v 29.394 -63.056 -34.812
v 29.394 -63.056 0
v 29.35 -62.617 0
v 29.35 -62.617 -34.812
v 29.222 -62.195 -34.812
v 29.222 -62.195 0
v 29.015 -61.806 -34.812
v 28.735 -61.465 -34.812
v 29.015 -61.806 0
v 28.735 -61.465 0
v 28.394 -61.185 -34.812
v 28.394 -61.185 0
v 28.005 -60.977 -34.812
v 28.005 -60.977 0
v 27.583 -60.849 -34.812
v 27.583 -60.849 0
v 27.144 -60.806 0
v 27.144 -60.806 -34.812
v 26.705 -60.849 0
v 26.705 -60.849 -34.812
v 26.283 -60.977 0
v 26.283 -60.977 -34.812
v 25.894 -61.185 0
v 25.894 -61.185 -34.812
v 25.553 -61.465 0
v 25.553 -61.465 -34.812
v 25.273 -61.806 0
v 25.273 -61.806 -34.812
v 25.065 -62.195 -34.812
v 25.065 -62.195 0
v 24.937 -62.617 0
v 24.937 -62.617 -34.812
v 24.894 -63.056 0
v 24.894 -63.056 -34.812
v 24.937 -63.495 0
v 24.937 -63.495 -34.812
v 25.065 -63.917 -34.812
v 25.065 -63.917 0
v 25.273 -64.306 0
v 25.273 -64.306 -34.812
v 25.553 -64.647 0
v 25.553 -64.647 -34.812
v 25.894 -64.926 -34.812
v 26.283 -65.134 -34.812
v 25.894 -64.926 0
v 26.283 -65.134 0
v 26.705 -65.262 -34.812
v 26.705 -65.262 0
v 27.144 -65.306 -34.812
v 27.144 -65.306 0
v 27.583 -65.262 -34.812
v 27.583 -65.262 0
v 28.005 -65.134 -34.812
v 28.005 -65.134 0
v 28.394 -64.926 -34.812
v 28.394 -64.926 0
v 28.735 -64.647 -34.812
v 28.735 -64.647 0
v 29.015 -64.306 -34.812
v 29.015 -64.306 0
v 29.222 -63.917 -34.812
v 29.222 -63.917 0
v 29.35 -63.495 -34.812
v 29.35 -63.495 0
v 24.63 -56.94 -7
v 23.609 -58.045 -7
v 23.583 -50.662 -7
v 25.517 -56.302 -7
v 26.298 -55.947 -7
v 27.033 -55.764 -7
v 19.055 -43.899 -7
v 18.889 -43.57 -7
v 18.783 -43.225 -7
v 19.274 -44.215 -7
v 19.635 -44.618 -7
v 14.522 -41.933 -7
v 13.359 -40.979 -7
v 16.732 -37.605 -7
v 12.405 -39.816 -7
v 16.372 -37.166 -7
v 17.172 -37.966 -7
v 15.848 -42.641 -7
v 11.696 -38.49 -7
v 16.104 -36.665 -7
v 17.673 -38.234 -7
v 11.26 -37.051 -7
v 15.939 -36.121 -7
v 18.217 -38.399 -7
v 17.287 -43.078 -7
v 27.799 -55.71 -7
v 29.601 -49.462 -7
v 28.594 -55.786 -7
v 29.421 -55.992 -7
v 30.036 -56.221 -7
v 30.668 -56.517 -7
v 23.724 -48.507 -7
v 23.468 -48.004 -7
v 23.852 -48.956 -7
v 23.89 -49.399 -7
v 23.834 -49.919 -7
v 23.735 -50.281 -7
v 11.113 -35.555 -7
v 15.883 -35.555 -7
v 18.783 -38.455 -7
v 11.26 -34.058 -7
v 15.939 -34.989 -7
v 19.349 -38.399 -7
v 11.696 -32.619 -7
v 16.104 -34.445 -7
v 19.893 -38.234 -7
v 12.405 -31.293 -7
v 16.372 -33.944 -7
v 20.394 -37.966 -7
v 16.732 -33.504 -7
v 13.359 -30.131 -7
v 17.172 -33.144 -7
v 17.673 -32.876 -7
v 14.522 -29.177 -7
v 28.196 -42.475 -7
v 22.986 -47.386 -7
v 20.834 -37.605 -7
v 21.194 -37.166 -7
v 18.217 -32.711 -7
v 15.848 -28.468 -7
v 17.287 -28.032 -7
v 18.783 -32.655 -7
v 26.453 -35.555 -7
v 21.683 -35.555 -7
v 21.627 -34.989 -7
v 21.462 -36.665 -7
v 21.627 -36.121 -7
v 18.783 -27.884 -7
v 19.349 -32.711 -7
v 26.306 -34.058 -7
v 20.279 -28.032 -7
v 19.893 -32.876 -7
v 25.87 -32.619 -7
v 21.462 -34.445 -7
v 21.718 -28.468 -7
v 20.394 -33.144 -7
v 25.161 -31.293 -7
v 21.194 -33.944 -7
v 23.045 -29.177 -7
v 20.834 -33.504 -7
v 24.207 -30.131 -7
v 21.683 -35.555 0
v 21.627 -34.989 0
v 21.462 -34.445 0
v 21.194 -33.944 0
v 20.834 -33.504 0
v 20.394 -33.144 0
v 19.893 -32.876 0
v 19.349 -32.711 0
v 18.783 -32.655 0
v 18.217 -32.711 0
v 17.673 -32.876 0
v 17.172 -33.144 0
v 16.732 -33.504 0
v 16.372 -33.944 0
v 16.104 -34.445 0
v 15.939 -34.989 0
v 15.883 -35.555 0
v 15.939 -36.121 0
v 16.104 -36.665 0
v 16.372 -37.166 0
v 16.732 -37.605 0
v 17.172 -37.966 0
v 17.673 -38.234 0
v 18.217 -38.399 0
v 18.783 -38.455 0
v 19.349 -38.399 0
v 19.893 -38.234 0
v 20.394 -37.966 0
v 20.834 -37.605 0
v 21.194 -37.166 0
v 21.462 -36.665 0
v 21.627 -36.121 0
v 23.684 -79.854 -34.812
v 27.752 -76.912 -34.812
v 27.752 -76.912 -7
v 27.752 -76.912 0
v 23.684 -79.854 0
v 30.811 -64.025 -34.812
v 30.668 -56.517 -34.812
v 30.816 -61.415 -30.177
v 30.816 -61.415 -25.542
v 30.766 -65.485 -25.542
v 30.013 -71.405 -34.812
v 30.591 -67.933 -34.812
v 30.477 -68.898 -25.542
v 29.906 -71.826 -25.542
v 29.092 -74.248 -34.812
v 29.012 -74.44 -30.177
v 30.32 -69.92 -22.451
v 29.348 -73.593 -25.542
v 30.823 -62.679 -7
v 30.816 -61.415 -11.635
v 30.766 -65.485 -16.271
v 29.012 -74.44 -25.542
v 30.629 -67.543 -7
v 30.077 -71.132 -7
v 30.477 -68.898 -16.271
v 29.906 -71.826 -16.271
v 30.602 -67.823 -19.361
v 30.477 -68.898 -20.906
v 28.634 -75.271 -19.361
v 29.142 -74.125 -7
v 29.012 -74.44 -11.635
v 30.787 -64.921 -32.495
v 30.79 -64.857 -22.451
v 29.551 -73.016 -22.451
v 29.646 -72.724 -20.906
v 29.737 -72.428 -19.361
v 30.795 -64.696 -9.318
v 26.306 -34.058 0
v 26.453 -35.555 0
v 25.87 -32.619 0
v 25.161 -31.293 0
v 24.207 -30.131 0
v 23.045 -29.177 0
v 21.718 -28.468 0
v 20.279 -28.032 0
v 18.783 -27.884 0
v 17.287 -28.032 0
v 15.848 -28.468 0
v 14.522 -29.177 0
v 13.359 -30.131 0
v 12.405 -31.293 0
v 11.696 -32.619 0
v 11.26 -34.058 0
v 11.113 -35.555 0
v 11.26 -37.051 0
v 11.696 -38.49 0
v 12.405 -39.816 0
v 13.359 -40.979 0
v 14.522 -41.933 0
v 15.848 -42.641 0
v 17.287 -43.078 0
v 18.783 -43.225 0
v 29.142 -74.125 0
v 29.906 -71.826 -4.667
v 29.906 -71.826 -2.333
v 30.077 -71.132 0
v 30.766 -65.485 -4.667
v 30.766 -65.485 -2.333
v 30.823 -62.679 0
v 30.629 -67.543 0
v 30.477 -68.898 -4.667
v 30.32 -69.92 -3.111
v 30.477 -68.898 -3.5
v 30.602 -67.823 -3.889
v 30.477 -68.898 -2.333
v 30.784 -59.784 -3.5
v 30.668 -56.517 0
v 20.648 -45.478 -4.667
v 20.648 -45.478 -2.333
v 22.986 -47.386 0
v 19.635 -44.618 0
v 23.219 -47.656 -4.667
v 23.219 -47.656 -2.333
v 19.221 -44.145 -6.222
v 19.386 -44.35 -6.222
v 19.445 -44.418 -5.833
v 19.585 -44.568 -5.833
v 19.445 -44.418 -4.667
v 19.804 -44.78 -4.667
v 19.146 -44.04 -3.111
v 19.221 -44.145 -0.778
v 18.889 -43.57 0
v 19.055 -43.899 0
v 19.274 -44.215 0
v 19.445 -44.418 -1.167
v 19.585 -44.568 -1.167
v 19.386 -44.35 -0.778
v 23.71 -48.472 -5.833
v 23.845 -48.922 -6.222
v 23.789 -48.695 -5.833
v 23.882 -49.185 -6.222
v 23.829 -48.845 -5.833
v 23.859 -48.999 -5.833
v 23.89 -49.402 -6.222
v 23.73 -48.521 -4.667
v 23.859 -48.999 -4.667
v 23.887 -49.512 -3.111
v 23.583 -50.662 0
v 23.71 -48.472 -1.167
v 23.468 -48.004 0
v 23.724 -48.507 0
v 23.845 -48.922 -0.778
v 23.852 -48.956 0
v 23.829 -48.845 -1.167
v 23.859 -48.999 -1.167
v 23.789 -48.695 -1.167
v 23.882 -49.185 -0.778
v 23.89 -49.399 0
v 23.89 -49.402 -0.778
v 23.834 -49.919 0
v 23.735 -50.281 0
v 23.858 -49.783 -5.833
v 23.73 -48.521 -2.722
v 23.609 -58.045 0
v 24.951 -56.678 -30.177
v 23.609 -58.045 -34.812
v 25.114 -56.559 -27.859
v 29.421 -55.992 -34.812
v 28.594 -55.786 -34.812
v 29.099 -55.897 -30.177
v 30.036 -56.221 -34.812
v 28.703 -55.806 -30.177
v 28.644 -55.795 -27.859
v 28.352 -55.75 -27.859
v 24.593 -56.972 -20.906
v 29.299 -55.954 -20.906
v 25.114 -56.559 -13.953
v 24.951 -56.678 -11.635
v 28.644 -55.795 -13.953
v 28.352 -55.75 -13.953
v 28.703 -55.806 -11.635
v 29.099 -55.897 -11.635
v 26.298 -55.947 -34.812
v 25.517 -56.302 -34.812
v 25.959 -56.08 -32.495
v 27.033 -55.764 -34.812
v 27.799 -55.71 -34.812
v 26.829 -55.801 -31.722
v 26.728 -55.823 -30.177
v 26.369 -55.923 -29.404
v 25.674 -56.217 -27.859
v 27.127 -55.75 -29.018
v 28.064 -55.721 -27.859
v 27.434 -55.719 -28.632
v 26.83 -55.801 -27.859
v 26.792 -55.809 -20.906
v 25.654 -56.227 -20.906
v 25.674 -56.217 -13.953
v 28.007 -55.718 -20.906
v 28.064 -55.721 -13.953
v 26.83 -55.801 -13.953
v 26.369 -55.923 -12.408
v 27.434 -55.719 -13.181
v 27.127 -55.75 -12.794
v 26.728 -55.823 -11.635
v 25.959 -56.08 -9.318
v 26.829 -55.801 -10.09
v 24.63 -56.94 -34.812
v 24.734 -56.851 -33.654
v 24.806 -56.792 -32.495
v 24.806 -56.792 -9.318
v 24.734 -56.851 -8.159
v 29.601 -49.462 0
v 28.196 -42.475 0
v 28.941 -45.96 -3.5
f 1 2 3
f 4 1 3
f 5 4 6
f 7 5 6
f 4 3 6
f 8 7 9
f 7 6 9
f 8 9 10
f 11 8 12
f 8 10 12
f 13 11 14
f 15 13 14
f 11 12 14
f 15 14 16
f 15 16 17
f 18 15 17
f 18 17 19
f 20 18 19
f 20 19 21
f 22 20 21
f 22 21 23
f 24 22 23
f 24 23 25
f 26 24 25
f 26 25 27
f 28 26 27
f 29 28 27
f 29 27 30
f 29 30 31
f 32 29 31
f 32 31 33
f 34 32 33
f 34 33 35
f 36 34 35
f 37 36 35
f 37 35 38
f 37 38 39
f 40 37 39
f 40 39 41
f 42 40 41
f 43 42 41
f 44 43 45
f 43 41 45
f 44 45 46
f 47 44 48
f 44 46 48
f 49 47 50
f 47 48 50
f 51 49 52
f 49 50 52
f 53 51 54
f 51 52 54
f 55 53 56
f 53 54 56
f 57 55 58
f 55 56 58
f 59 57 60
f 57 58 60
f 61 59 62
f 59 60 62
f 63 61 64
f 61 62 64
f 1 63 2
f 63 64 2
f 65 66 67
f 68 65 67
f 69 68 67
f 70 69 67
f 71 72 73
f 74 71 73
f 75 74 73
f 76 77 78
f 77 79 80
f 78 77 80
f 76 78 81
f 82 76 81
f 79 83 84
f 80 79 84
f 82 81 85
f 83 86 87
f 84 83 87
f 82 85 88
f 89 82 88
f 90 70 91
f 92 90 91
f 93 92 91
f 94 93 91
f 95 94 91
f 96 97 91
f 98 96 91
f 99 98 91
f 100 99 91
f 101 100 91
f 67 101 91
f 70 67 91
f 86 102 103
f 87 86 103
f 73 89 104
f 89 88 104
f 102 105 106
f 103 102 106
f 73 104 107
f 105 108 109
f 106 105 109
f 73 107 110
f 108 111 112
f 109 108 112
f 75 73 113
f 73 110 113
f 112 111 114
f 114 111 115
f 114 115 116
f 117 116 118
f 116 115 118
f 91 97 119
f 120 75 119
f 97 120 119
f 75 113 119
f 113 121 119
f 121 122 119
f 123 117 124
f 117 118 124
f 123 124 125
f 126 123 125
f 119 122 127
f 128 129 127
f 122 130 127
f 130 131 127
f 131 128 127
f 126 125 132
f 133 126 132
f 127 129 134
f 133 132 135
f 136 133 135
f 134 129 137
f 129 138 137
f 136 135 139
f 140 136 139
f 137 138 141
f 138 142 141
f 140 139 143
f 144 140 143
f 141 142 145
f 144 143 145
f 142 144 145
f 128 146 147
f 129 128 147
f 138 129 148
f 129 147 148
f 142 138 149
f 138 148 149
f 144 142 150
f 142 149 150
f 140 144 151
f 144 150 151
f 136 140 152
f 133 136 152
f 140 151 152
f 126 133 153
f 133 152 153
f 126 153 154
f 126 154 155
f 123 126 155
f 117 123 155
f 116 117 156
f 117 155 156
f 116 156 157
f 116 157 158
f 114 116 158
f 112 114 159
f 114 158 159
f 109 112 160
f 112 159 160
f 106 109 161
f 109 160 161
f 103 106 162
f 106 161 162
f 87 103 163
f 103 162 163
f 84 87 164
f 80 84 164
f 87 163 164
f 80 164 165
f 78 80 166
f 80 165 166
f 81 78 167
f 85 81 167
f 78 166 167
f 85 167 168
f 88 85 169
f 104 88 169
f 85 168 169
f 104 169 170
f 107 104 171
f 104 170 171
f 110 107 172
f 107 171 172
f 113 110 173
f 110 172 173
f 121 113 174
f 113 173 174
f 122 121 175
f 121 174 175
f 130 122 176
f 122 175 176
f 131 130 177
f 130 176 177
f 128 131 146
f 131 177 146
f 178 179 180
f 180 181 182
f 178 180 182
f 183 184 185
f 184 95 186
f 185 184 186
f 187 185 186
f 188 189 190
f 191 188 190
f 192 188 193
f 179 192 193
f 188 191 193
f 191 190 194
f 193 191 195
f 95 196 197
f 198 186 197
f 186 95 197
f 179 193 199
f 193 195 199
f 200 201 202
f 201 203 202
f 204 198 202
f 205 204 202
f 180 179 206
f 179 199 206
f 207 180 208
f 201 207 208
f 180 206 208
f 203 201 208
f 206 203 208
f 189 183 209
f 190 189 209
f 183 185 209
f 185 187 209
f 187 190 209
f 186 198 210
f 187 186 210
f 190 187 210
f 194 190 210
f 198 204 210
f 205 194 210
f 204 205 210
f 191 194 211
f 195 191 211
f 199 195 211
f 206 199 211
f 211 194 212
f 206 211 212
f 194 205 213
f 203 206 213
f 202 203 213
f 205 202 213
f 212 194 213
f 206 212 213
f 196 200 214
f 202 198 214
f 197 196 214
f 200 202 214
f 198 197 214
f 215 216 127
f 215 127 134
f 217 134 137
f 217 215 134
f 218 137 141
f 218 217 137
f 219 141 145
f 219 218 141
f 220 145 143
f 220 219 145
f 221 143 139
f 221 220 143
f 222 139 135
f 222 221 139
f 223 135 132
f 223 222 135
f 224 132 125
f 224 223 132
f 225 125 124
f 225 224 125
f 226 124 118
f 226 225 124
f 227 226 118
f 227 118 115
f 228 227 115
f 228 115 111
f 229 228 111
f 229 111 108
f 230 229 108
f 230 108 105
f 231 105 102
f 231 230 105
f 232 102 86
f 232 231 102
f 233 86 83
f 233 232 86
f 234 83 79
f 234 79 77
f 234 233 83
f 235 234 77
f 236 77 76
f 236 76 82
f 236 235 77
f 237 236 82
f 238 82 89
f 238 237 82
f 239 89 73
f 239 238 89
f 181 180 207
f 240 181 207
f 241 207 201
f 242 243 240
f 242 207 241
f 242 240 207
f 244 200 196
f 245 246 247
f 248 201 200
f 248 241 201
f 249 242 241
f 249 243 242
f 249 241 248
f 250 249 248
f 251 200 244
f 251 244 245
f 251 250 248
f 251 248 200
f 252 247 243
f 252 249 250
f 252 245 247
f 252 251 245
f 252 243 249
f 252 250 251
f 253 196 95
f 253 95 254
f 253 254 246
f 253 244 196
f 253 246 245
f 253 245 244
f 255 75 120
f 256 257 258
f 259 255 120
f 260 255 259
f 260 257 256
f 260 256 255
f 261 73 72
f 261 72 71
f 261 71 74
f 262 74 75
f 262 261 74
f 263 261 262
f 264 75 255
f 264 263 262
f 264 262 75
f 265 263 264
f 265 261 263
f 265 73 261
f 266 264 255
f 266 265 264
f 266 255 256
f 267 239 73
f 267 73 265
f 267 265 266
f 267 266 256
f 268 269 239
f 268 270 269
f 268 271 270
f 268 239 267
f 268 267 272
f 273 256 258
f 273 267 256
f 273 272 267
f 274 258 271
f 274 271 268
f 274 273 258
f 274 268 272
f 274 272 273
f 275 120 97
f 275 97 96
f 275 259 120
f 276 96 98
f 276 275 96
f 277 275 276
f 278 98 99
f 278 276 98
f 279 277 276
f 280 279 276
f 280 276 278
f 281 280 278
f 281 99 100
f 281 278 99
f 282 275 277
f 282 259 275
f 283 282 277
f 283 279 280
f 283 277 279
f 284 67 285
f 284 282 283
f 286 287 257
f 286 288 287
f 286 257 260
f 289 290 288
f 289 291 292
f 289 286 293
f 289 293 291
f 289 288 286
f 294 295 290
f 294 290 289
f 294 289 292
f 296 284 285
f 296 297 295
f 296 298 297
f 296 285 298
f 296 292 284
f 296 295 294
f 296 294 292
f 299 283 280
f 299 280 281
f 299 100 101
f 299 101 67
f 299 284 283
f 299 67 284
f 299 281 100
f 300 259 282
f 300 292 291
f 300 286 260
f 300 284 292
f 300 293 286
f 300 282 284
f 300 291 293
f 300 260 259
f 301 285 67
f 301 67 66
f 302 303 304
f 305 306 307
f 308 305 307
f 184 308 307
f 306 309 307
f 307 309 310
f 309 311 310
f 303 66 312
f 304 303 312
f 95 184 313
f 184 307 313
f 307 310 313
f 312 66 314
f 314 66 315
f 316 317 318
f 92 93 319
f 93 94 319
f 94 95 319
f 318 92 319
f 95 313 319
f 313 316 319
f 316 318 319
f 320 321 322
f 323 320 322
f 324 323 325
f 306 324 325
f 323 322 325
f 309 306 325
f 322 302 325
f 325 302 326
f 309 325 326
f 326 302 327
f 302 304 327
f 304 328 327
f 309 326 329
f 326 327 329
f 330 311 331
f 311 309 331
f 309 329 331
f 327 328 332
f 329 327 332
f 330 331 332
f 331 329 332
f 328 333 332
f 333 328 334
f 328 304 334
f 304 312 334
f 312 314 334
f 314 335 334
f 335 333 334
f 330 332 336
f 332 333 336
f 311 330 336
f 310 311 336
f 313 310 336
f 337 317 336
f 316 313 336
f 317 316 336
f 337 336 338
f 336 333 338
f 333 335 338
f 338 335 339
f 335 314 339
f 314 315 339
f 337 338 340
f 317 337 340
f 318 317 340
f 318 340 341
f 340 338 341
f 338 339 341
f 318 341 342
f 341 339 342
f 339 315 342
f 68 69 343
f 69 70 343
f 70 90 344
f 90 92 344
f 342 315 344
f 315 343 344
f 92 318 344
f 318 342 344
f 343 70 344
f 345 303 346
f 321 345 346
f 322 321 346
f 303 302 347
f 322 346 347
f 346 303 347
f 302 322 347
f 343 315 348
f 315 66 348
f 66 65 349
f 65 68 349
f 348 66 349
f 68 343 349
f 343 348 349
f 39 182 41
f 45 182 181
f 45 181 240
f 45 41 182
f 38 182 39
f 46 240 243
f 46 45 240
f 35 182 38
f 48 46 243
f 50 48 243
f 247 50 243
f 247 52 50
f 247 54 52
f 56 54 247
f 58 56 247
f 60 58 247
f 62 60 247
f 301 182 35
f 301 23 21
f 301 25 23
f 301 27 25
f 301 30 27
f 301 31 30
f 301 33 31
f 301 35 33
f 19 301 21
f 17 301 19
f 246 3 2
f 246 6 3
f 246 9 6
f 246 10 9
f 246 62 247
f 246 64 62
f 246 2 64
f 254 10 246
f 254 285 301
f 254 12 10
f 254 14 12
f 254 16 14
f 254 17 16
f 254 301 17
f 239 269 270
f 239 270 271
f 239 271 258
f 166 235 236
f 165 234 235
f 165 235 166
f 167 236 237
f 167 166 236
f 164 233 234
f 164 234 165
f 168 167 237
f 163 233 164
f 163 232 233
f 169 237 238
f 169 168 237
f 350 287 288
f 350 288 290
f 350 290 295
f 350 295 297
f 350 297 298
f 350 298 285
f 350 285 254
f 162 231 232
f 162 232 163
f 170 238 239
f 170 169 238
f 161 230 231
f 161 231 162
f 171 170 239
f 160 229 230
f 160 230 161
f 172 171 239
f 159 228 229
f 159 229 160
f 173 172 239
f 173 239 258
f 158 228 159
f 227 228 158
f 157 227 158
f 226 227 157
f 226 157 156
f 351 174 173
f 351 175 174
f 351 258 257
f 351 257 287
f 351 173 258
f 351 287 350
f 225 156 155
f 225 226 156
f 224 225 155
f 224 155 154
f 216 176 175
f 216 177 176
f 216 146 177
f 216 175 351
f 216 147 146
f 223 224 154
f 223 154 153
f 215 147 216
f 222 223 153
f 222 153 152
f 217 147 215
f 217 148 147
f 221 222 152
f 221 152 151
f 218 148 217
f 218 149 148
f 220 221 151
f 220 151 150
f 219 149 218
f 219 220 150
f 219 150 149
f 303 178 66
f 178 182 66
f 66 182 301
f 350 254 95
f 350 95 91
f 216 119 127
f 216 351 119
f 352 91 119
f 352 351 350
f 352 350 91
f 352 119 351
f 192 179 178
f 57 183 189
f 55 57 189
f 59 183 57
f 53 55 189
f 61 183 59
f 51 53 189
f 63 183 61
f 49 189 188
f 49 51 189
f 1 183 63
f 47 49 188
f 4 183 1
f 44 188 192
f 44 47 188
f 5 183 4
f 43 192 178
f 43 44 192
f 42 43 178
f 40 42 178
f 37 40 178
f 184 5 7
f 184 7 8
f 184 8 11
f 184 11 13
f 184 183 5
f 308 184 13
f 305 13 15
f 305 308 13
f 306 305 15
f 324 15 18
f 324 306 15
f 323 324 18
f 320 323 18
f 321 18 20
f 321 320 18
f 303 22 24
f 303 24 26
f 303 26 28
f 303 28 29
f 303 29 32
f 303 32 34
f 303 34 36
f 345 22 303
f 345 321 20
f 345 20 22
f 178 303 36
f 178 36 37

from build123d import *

# Parameters (mm, degrees)
SKETCH1_R           = 2.9
BOSS_EXTRUDE1_DEPTH = 7
BOSS_EXTRUDE2_DEPTH = 27.812432
SKETCH3_R           = 2.25
CUT_EXTRUDE1_DEPTH  = 93.404830354


with BuildPart() as part:
    # Sketch1 → Boss-Extrude1 (new body)
    with BuildSketch(Plane.XY):
        with BuildLine():
            Line((23.684222564, -79.854061858), (27.751665024, -76.911614194))
            add(Edge.make_bspline(
                [(27.751665024, -76.911614194), (30.665612651, -71.996437575), (31.13217948, -67.256532156), (30.668059578, -56.517089881)],
                knots=[0.222415535, 0.222415535, 0.222415535, 0.222415535, 0.766682965, 0.766682965, 0.766682965, 0.766682965], degree=3))
            add(Edge.make_bspline(
                [(30.668059578, -56.517089881), (29.320428981, -45.88374403), (26.453494832, -35.554786486)],
                knots=[0, 0, 0, 1, 1, 1], degree=2))
            ThreePointArc((26.453494832, -35.554786486), (13.359197662, -30.130951008), (18.783033139, -43.225248178))
            add(Edge.make_bspline(
                [(18.783033139, -43.225248178), (19.322772584, -45.817228322), (25.294082339, -46.94058971), (23.583083134, -50.662102957)],
                knots=[0, 0, 0, 0, 1, 1, 1, 1], degree=3))
            Line((23.583083134, -50.662102957), (23.608661583, -58.04483203))
            Line((23.608661583, -58.04483203), (23.684222564, -79.854061858))
        make_face()
        with Locations((18.783033139, -35.554786486)):
            Circle(SKETCH1_R, mode=Mode.SUBTRACT)
    extrude(amount=-BOSS_EXTRUDE1_DEPTH)

    # Sketch2 → Boss-Extrude2 (add)
    with BuildSketch(Plane(origin=(0, 0, -7), x_dir=(-1, 0, 0), z_dir=(0, 0, -1))):
        with BuildLine():
            Line((-27.751665024, -76.911614194), (-23.684222564, -79.854061858))
            Line((-23.684222564, -79.854061858), (-23.608661583, -58.04483203))
            add(Edge.make_bspline(
                [(-23.608661583, -58.04483203), (-26.446360253, -54.336432943), (-30.668059578, -56.51708988)],
                knots=[0, 0, 0, 1, 1, 1], degree=2))
            add(Edge.make_bspline(
                [(-30.668059578, -56.51708988), (-31.132179479, -67.256532155), (-30.665612651, -71.996437575), (-27.751665024, -76.911614194)],
                knots=[0.222415535, 0.222415535, 0.222415535, 0.222415535, 0.766682965, 0.766682965, 0.766682965, 0.766682965], degree=3))
        make_face()
    extrude(amount=BOSS_EXTRUDE2_DEPTH)

    # Sketch3 → Cut-Extrude1 (cut, through all)
    with BuildSketch(Plane.XY):
        with Locations((27.143723241, -63.055671712)):
            Circle(SKETCH3_R)
    extrude(amount=-CUT_EXTRUDE1_DEPTH, mode=Mode.SUBTRACT)


solid = part.part
